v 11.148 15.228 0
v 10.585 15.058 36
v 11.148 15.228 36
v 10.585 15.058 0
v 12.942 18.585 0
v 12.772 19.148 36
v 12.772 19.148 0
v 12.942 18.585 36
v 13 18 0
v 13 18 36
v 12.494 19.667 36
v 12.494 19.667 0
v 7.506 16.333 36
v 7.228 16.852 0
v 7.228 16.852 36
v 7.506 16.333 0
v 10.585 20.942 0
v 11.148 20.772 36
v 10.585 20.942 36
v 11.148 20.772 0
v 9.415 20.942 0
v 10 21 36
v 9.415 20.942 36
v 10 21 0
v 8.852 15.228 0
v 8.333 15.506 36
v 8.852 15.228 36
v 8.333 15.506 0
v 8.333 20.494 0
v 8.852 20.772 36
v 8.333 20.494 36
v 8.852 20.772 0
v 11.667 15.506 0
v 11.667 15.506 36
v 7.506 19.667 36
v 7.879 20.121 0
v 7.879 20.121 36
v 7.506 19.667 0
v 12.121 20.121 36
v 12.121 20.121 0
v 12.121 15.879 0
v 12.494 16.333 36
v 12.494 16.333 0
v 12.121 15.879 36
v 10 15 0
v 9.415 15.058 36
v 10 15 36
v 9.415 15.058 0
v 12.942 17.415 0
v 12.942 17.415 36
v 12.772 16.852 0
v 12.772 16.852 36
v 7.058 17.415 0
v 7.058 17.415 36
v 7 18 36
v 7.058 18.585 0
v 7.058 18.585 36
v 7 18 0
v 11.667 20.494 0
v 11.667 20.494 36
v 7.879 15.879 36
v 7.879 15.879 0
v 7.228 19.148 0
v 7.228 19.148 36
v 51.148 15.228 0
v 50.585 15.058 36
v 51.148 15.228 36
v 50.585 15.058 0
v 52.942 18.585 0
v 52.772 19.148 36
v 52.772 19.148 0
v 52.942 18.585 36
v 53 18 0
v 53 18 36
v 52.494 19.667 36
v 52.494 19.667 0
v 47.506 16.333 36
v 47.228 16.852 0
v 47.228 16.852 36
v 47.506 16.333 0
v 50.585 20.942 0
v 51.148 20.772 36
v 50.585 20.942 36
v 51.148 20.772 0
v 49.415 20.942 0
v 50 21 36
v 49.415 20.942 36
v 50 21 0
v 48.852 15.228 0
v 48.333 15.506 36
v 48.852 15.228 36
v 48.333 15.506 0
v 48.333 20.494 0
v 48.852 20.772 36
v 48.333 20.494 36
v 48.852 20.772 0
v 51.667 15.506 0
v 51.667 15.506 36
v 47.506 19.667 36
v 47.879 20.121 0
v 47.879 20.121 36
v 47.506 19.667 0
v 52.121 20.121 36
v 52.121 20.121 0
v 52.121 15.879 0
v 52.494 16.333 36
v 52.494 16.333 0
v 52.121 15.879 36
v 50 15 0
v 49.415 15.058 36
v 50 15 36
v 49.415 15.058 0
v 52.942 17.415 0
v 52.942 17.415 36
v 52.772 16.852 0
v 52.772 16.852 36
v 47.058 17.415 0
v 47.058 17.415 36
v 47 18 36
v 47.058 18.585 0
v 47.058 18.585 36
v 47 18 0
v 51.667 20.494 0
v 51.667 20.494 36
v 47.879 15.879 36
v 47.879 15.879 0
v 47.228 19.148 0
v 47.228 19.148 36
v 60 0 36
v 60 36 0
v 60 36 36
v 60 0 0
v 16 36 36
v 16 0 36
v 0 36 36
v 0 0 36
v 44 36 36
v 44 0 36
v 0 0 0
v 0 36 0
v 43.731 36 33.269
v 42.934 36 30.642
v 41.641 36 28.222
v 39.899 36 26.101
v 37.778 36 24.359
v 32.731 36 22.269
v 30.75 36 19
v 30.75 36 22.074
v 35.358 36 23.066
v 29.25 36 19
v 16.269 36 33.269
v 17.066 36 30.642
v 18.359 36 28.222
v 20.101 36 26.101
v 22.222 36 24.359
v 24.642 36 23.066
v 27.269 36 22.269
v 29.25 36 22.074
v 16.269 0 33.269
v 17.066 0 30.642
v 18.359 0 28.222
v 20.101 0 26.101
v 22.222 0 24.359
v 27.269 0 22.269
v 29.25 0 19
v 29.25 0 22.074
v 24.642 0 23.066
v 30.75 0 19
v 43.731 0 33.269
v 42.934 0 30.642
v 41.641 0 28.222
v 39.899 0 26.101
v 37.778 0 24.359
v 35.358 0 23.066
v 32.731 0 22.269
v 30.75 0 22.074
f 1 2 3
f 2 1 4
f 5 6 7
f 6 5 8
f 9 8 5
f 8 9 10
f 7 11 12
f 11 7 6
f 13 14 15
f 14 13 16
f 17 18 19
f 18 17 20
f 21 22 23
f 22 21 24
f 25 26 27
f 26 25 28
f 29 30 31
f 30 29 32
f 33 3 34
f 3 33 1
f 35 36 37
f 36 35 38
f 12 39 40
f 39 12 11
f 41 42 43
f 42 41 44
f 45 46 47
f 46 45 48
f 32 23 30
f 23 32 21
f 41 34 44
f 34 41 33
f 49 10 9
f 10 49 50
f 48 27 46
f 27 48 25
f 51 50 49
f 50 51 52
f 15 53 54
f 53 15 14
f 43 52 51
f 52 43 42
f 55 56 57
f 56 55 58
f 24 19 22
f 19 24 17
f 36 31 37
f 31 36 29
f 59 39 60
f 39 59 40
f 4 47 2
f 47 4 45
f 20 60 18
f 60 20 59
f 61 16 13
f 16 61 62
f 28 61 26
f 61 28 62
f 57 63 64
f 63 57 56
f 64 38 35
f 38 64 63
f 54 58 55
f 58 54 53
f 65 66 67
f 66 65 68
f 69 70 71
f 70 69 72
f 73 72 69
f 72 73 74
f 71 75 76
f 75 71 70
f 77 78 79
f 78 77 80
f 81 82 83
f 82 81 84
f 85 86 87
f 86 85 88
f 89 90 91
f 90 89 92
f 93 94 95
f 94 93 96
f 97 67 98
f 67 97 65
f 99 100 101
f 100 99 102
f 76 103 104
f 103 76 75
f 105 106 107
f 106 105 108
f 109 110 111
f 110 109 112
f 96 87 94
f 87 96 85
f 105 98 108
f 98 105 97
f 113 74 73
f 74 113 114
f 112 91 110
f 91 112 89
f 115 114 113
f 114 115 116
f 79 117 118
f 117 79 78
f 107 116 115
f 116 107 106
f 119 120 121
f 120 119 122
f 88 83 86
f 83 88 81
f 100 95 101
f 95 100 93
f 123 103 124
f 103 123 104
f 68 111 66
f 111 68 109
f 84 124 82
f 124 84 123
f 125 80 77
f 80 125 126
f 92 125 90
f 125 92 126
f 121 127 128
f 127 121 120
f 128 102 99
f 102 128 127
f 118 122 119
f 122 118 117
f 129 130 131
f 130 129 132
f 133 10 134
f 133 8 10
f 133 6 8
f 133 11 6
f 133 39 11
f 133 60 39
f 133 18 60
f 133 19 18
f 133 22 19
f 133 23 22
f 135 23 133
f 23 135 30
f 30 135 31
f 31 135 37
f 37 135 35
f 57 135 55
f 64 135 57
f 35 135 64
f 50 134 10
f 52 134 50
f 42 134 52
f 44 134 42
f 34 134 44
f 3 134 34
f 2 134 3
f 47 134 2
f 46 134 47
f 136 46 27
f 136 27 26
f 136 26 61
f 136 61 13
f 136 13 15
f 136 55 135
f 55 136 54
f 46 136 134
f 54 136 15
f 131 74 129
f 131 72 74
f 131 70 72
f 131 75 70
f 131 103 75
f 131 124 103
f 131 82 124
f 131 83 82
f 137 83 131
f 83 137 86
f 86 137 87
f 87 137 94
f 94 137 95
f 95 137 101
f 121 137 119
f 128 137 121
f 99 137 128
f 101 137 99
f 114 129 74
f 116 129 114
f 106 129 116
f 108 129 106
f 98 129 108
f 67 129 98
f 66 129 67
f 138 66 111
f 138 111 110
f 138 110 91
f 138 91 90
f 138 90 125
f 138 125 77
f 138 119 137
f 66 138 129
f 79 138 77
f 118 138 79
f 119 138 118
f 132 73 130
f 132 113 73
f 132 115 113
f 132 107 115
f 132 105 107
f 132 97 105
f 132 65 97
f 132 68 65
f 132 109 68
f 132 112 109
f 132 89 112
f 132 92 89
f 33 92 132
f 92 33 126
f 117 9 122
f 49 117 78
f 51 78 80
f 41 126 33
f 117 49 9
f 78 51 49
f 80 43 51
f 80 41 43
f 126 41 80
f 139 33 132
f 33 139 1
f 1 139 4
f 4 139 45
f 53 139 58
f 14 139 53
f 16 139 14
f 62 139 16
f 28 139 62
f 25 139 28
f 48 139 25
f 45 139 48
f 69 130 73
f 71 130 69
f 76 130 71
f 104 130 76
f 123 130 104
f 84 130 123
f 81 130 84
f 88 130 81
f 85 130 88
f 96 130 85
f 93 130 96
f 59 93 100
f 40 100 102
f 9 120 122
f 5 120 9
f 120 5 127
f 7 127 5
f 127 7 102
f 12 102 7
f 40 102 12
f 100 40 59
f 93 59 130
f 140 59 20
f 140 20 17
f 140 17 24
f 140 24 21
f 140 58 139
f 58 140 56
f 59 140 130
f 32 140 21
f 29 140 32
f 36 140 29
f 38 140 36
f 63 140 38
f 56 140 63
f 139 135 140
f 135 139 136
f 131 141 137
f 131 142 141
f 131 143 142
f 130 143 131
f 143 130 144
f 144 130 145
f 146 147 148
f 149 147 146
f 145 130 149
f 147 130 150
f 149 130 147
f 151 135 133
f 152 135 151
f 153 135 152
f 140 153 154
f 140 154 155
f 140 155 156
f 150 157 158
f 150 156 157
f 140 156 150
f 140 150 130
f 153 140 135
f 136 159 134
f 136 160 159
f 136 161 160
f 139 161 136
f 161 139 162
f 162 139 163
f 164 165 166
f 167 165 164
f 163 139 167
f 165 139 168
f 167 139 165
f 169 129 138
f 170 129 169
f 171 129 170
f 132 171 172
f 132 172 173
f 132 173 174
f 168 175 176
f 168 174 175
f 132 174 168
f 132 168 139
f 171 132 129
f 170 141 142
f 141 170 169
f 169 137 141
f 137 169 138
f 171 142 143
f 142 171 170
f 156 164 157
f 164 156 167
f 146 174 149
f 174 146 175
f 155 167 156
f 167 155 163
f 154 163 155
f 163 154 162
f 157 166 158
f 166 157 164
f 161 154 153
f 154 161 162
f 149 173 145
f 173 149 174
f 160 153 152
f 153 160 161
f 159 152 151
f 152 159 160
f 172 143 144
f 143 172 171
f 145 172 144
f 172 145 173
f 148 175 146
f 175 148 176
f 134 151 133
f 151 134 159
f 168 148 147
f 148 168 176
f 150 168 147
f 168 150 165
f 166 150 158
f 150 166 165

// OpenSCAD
$fn = 32;

// ----------------------------------------------------------------------
// Saddle clamp: split shaft clamp
// ----------------------------------------------------------------------

// --- parameters (mm) ---
blk_l = 60;               // block length, X
blk_w = 36;               // block width, Y
blk_h = 36;               // block height
clamp_r = 14;             // shaft groove radius
hole_r = 3;               // bolt hole radius
hole_m = 10;              // bolt hole margin from the ends
saw_w = 1.5;              // saw kerf width

saw_depth = clamp_r + 3;  // saw kerf depth

difference() {
  cube([blk_l, blk_w, blk_h]);
  translate([blk_l / 2, -1, blk_h])
    rotate([-90, 0, 0])
      cylinder(h = blk_w + 2, r = clamp_r);
  for (sx = [0, 1])
    translate([sx ? blk_l - hole_m : hole_m, blk_w / 2, -1])
      cylinder(r = hole_r, h = blk_h + 2);
  translate([blk_l / 2 - saw_w / 2, -1, blk_h - saw_depth])
    cube([saw_w, blk_w + 2, saw_depth + 1]);
}
